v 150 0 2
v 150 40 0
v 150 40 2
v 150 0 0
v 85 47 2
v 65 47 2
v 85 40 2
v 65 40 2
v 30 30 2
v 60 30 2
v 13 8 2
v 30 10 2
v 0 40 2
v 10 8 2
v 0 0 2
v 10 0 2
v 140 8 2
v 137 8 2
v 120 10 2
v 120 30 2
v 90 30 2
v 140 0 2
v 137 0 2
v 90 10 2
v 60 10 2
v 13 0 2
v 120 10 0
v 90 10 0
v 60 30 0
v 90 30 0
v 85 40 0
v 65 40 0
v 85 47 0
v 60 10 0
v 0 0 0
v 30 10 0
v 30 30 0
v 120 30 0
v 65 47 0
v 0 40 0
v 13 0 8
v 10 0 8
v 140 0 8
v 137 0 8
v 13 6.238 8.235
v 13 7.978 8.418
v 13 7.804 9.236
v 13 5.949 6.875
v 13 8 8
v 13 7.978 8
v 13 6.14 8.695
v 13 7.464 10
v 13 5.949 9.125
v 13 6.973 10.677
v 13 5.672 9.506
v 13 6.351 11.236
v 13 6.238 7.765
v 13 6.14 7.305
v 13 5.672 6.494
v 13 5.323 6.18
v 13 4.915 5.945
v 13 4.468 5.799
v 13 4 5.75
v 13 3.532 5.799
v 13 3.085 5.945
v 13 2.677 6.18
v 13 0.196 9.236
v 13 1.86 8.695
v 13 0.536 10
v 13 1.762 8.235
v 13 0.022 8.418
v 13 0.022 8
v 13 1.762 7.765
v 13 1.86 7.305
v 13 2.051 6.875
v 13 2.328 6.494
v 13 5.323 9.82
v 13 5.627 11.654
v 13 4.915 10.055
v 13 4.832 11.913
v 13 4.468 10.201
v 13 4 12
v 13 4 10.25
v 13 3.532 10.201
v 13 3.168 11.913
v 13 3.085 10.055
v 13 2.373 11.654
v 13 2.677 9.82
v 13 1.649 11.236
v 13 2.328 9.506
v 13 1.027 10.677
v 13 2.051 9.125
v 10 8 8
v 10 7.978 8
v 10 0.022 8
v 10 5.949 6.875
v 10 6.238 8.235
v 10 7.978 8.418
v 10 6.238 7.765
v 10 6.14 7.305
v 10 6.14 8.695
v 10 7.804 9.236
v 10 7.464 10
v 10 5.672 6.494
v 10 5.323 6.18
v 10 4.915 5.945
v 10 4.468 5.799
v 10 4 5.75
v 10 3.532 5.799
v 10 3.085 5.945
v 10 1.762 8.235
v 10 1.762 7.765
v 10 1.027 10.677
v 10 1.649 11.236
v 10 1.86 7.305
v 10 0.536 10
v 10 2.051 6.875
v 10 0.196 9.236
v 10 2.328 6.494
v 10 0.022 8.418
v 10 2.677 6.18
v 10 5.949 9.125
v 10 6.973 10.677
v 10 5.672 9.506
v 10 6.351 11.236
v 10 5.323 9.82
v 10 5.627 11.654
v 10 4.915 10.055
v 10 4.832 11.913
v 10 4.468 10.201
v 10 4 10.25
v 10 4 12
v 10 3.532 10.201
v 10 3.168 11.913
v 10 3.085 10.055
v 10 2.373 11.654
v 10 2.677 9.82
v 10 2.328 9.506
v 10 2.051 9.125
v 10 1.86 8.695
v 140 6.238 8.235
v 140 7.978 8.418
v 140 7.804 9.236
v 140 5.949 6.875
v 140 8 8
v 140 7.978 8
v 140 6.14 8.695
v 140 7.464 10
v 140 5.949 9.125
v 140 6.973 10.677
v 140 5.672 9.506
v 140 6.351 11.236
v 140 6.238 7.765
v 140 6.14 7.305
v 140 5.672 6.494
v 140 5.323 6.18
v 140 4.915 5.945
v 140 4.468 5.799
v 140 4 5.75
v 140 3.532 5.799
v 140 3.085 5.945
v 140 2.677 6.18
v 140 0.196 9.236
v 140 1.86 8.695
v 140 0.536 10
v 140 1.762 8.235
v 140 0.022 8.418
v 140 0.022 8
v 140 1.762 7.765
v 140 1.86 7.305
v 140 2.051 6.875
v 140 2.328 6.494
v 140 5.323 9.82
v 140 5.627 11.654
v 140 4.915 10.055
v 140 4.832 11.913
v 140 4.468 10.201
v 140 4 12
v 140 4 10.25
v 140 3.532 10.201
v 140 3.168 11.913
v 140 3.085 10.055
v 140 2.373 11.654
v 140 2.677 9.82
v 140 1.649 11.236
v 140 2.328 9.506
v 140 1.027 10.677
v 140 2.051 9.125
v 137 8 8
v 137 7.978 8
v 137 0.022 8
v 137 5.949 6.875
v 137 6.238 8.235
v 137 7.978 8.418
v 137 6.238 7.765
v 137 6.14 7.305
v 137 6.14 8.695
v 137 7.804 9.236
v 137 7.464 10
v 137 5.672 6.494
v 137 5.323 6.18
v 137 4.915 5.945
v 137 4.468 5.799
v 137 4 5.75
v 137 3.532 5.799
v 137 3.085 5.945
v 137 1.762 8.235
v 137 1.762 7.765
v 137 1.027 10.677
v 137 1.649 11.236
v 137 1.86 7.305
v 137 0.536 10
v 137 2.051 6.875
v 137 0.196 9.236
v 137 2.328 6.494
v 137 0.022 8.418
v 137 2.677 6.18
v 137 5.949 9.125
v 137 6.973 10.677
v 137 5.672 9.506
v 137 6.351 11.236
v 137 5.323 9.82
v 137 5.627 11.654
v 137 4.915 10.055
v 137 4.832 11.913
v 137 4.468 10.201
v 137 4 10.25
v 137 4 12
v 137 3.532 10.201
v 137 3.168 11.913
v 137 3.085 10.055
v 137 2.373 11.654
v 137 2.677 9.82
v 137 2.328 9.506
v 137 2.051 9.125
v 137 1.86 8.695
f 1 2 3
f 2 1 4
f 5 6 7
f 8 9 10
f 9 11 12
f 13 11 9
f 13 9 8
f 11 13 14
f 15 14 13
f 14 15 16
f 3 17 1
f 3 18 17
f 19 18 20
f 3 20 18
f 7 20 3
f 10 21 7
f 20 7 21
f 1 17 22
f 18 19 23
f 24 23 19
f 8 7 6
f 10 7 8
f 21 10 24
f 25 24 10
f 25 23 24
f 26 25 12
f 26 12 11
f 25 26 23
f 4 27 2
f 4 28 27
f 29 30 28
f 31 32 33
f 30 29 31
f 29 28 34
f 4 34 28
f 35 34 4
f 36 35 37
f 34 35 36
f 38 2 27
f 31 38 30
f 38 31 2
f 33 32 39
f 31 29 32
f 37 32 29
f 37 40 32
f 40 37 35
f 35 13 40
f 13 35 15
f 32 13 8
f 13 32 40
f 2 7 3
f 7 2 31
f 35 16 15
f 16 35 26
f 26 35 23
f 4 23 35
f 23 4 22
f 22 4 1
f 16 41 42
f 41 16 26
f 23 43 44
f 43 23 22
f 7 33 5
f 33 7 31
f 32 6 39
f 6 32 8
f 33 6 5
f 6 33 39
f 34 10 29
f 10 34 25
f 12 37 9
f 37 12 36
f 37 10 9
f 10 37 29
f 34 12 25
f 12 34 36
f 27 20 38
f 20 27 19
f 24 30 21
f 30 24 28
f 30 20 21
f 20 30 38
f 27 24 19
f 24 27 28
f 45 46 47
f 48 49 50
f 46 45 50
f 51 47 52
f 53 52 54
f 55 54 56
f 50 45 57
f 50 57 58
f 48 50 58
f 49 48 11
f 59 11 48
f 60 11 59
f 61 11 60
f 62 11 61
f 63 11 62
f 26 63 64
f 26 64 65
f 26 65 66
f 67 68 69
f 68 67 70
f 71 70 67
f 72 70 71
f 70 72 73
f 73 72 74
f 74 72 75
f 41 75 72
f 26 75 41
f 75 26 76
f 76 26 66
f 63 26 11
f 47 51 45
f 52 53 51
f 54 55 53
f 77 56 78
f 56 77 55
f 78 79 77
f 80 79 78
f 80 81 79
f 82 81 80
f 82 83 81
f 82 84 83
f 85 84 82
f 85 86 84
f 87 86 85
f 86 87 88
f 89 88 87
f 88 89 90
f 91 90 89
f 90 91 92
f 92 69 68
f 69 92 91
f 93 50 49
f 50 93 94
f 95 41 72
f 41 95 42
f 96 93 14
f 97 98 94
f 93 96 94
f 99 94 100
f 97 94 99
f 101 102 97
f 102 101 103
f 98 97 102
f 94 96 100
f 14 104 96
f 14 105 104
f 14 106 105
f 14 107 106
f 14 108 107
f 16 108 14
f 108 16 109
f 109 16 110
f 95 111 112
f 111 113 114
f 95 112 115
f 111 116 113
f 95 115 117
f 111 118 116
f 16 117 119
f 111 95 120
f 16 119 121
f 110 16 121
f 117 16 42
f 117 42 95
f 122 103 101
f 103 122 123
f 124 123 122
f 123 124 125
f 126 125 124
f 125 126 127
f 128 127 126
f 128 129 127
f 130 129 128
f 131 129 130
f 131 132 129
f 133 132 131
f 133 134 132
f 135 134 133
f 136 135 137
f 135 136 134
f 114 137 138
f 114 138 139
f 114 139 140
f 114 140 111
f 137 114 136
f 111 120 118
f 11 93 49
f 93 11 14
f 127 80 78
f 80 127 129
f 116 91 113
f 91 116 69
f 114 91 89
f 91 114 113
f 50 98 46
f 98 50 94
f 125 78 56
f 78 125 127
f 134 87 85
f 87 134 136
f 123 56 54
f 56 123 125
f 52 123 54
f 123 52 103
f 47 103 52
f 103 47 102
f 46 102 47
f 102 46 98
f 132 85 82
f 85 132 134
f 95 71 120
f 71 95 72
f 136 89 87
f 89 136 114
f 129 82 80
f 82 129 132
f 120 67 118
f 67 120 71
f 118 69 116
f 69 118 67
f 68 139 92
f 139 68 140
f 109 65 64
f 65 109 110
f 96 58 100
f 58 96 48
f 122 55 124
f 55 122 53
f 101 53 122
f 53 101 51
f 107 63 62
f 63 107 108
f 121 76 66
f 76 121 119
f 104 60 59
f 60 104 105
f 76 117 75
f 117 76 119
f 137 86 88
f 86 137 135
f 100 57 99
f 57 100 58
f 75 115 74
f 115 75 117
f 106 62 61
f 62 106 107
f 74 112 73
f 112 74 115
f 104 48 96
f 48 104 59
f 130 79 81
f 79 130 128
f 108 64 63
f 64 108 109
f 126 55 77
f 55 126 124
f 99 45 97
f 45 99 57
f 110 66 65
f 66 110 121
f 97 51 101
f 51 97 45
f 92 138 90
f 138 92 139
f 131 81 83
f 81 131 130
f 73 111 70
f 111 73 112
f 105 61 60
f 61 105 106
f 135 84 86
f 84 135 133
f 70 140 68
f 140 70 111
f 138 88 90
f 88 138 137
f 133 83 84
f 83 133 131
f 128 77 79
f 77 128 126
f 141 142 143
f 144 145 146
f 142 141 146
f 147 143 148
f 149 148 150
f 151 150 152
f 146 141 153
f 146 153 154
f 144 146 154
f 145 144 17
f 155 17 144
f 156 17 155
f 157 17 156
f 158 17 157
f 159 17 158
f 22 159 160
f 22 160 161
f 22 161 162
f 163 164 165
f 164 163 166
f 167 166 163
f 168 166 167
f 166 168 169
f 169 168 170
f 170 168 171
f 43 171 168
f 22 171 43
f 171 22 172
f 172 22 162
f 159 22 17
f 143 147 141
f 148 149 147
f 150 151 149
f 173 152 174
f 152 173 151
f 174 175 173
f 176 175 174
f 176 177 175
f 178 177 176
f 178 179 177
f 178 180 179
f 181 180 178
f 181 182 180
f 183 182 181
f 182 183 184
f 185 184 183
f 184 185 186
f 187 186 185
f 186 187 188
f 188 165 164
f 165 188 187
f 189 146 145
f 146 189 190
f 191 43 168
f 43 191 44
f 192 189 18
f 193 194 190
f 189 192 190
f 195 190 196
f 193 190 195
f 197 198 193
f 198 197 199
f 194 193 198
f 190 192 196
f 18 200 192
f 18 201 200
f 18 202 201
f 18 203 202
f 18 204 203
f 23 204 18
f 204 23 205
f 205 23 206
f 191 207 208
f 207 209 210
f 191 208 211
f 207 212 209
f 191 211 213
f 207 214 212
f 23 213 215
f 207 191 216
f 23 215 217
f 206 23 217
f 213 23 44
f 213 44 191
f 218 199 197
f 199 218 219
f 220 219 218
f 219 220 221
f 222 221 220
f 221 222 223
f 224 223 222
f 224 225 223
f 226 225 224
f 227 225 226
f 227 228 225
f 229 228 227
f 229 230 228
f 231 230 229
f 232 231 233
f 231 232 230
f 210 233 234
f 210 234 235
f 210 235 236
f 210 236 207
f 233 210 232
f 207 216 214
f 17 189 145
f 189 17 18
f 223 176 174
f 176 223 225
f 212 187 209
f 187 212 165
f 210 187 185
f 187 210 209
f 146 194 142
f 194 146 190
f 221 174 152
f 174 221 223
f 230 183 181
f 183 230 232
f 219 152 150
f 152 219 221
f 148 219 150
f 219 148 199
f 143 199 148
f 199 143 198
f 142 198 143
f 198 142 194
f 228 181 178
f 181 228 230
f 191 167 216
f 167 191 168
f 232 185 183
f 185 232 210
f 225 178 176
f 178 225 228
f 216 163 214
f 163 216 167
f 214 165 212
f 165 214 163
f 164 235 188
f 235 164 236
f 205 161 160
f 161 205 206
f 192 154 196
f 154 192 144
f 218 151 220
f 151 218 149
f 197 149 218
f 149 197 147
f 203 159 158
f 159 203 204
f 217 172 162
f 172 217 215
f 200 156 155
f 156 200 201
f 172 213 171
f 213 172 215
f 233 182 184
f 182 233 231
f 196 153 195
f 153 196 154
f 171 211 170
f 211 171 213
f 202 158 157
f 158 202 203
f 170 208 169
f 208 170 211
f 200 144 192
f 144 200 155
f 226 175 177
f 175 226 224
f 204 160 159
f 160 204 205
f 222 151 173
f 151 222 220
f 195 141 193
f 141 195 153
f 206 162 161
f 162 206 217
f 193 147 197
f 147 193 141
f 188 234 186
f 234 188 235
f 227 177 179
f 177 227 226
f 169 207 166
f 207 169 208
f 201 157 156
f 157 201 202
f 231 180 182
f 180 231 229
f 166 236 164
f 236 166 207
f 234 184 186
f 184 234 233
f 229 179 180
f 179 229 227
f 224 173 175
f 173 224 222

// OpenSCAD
// file: joint.scad
module joint(groundSpacing)
{
  hch = groundSpacing + 8/2;  // hole center height

  difference()
  {
    // main element
    union()
    {
      cube([3, 8, hch]);
      translate([0, 8/2, hch])
        rotate([0, 90, 0])
          cylinder(r=8/2, h=3, $fs=0.01);
    }
    // screw hole
    translate([-1, 8/2, hch])
      rotate([0, 90, 0])
        cylinder(r=4.5/2, h=3+2*1, $fs=0.01);
  }
}


joint(1);
// main file
use <joint.scad>

module _wallSurface()
{
  difference()
  {
    union()
    {
      // root element
      cube([150, 40, 2]);
      // lock mount
      translate([(150-20)/2, 40, 0])
        cube([20, 7, 2]);
    }
    // holes
    for(offset = [30, 90])
      translate([offset, 10, 0])
        cube([30, 20, 2]);
  }
}


module wallMount()
{
  _wallSurface();
  for(offset = [10, 150-10-3])
    translate([offset, 0, 2])
      joint(2);
}


wallMount();
